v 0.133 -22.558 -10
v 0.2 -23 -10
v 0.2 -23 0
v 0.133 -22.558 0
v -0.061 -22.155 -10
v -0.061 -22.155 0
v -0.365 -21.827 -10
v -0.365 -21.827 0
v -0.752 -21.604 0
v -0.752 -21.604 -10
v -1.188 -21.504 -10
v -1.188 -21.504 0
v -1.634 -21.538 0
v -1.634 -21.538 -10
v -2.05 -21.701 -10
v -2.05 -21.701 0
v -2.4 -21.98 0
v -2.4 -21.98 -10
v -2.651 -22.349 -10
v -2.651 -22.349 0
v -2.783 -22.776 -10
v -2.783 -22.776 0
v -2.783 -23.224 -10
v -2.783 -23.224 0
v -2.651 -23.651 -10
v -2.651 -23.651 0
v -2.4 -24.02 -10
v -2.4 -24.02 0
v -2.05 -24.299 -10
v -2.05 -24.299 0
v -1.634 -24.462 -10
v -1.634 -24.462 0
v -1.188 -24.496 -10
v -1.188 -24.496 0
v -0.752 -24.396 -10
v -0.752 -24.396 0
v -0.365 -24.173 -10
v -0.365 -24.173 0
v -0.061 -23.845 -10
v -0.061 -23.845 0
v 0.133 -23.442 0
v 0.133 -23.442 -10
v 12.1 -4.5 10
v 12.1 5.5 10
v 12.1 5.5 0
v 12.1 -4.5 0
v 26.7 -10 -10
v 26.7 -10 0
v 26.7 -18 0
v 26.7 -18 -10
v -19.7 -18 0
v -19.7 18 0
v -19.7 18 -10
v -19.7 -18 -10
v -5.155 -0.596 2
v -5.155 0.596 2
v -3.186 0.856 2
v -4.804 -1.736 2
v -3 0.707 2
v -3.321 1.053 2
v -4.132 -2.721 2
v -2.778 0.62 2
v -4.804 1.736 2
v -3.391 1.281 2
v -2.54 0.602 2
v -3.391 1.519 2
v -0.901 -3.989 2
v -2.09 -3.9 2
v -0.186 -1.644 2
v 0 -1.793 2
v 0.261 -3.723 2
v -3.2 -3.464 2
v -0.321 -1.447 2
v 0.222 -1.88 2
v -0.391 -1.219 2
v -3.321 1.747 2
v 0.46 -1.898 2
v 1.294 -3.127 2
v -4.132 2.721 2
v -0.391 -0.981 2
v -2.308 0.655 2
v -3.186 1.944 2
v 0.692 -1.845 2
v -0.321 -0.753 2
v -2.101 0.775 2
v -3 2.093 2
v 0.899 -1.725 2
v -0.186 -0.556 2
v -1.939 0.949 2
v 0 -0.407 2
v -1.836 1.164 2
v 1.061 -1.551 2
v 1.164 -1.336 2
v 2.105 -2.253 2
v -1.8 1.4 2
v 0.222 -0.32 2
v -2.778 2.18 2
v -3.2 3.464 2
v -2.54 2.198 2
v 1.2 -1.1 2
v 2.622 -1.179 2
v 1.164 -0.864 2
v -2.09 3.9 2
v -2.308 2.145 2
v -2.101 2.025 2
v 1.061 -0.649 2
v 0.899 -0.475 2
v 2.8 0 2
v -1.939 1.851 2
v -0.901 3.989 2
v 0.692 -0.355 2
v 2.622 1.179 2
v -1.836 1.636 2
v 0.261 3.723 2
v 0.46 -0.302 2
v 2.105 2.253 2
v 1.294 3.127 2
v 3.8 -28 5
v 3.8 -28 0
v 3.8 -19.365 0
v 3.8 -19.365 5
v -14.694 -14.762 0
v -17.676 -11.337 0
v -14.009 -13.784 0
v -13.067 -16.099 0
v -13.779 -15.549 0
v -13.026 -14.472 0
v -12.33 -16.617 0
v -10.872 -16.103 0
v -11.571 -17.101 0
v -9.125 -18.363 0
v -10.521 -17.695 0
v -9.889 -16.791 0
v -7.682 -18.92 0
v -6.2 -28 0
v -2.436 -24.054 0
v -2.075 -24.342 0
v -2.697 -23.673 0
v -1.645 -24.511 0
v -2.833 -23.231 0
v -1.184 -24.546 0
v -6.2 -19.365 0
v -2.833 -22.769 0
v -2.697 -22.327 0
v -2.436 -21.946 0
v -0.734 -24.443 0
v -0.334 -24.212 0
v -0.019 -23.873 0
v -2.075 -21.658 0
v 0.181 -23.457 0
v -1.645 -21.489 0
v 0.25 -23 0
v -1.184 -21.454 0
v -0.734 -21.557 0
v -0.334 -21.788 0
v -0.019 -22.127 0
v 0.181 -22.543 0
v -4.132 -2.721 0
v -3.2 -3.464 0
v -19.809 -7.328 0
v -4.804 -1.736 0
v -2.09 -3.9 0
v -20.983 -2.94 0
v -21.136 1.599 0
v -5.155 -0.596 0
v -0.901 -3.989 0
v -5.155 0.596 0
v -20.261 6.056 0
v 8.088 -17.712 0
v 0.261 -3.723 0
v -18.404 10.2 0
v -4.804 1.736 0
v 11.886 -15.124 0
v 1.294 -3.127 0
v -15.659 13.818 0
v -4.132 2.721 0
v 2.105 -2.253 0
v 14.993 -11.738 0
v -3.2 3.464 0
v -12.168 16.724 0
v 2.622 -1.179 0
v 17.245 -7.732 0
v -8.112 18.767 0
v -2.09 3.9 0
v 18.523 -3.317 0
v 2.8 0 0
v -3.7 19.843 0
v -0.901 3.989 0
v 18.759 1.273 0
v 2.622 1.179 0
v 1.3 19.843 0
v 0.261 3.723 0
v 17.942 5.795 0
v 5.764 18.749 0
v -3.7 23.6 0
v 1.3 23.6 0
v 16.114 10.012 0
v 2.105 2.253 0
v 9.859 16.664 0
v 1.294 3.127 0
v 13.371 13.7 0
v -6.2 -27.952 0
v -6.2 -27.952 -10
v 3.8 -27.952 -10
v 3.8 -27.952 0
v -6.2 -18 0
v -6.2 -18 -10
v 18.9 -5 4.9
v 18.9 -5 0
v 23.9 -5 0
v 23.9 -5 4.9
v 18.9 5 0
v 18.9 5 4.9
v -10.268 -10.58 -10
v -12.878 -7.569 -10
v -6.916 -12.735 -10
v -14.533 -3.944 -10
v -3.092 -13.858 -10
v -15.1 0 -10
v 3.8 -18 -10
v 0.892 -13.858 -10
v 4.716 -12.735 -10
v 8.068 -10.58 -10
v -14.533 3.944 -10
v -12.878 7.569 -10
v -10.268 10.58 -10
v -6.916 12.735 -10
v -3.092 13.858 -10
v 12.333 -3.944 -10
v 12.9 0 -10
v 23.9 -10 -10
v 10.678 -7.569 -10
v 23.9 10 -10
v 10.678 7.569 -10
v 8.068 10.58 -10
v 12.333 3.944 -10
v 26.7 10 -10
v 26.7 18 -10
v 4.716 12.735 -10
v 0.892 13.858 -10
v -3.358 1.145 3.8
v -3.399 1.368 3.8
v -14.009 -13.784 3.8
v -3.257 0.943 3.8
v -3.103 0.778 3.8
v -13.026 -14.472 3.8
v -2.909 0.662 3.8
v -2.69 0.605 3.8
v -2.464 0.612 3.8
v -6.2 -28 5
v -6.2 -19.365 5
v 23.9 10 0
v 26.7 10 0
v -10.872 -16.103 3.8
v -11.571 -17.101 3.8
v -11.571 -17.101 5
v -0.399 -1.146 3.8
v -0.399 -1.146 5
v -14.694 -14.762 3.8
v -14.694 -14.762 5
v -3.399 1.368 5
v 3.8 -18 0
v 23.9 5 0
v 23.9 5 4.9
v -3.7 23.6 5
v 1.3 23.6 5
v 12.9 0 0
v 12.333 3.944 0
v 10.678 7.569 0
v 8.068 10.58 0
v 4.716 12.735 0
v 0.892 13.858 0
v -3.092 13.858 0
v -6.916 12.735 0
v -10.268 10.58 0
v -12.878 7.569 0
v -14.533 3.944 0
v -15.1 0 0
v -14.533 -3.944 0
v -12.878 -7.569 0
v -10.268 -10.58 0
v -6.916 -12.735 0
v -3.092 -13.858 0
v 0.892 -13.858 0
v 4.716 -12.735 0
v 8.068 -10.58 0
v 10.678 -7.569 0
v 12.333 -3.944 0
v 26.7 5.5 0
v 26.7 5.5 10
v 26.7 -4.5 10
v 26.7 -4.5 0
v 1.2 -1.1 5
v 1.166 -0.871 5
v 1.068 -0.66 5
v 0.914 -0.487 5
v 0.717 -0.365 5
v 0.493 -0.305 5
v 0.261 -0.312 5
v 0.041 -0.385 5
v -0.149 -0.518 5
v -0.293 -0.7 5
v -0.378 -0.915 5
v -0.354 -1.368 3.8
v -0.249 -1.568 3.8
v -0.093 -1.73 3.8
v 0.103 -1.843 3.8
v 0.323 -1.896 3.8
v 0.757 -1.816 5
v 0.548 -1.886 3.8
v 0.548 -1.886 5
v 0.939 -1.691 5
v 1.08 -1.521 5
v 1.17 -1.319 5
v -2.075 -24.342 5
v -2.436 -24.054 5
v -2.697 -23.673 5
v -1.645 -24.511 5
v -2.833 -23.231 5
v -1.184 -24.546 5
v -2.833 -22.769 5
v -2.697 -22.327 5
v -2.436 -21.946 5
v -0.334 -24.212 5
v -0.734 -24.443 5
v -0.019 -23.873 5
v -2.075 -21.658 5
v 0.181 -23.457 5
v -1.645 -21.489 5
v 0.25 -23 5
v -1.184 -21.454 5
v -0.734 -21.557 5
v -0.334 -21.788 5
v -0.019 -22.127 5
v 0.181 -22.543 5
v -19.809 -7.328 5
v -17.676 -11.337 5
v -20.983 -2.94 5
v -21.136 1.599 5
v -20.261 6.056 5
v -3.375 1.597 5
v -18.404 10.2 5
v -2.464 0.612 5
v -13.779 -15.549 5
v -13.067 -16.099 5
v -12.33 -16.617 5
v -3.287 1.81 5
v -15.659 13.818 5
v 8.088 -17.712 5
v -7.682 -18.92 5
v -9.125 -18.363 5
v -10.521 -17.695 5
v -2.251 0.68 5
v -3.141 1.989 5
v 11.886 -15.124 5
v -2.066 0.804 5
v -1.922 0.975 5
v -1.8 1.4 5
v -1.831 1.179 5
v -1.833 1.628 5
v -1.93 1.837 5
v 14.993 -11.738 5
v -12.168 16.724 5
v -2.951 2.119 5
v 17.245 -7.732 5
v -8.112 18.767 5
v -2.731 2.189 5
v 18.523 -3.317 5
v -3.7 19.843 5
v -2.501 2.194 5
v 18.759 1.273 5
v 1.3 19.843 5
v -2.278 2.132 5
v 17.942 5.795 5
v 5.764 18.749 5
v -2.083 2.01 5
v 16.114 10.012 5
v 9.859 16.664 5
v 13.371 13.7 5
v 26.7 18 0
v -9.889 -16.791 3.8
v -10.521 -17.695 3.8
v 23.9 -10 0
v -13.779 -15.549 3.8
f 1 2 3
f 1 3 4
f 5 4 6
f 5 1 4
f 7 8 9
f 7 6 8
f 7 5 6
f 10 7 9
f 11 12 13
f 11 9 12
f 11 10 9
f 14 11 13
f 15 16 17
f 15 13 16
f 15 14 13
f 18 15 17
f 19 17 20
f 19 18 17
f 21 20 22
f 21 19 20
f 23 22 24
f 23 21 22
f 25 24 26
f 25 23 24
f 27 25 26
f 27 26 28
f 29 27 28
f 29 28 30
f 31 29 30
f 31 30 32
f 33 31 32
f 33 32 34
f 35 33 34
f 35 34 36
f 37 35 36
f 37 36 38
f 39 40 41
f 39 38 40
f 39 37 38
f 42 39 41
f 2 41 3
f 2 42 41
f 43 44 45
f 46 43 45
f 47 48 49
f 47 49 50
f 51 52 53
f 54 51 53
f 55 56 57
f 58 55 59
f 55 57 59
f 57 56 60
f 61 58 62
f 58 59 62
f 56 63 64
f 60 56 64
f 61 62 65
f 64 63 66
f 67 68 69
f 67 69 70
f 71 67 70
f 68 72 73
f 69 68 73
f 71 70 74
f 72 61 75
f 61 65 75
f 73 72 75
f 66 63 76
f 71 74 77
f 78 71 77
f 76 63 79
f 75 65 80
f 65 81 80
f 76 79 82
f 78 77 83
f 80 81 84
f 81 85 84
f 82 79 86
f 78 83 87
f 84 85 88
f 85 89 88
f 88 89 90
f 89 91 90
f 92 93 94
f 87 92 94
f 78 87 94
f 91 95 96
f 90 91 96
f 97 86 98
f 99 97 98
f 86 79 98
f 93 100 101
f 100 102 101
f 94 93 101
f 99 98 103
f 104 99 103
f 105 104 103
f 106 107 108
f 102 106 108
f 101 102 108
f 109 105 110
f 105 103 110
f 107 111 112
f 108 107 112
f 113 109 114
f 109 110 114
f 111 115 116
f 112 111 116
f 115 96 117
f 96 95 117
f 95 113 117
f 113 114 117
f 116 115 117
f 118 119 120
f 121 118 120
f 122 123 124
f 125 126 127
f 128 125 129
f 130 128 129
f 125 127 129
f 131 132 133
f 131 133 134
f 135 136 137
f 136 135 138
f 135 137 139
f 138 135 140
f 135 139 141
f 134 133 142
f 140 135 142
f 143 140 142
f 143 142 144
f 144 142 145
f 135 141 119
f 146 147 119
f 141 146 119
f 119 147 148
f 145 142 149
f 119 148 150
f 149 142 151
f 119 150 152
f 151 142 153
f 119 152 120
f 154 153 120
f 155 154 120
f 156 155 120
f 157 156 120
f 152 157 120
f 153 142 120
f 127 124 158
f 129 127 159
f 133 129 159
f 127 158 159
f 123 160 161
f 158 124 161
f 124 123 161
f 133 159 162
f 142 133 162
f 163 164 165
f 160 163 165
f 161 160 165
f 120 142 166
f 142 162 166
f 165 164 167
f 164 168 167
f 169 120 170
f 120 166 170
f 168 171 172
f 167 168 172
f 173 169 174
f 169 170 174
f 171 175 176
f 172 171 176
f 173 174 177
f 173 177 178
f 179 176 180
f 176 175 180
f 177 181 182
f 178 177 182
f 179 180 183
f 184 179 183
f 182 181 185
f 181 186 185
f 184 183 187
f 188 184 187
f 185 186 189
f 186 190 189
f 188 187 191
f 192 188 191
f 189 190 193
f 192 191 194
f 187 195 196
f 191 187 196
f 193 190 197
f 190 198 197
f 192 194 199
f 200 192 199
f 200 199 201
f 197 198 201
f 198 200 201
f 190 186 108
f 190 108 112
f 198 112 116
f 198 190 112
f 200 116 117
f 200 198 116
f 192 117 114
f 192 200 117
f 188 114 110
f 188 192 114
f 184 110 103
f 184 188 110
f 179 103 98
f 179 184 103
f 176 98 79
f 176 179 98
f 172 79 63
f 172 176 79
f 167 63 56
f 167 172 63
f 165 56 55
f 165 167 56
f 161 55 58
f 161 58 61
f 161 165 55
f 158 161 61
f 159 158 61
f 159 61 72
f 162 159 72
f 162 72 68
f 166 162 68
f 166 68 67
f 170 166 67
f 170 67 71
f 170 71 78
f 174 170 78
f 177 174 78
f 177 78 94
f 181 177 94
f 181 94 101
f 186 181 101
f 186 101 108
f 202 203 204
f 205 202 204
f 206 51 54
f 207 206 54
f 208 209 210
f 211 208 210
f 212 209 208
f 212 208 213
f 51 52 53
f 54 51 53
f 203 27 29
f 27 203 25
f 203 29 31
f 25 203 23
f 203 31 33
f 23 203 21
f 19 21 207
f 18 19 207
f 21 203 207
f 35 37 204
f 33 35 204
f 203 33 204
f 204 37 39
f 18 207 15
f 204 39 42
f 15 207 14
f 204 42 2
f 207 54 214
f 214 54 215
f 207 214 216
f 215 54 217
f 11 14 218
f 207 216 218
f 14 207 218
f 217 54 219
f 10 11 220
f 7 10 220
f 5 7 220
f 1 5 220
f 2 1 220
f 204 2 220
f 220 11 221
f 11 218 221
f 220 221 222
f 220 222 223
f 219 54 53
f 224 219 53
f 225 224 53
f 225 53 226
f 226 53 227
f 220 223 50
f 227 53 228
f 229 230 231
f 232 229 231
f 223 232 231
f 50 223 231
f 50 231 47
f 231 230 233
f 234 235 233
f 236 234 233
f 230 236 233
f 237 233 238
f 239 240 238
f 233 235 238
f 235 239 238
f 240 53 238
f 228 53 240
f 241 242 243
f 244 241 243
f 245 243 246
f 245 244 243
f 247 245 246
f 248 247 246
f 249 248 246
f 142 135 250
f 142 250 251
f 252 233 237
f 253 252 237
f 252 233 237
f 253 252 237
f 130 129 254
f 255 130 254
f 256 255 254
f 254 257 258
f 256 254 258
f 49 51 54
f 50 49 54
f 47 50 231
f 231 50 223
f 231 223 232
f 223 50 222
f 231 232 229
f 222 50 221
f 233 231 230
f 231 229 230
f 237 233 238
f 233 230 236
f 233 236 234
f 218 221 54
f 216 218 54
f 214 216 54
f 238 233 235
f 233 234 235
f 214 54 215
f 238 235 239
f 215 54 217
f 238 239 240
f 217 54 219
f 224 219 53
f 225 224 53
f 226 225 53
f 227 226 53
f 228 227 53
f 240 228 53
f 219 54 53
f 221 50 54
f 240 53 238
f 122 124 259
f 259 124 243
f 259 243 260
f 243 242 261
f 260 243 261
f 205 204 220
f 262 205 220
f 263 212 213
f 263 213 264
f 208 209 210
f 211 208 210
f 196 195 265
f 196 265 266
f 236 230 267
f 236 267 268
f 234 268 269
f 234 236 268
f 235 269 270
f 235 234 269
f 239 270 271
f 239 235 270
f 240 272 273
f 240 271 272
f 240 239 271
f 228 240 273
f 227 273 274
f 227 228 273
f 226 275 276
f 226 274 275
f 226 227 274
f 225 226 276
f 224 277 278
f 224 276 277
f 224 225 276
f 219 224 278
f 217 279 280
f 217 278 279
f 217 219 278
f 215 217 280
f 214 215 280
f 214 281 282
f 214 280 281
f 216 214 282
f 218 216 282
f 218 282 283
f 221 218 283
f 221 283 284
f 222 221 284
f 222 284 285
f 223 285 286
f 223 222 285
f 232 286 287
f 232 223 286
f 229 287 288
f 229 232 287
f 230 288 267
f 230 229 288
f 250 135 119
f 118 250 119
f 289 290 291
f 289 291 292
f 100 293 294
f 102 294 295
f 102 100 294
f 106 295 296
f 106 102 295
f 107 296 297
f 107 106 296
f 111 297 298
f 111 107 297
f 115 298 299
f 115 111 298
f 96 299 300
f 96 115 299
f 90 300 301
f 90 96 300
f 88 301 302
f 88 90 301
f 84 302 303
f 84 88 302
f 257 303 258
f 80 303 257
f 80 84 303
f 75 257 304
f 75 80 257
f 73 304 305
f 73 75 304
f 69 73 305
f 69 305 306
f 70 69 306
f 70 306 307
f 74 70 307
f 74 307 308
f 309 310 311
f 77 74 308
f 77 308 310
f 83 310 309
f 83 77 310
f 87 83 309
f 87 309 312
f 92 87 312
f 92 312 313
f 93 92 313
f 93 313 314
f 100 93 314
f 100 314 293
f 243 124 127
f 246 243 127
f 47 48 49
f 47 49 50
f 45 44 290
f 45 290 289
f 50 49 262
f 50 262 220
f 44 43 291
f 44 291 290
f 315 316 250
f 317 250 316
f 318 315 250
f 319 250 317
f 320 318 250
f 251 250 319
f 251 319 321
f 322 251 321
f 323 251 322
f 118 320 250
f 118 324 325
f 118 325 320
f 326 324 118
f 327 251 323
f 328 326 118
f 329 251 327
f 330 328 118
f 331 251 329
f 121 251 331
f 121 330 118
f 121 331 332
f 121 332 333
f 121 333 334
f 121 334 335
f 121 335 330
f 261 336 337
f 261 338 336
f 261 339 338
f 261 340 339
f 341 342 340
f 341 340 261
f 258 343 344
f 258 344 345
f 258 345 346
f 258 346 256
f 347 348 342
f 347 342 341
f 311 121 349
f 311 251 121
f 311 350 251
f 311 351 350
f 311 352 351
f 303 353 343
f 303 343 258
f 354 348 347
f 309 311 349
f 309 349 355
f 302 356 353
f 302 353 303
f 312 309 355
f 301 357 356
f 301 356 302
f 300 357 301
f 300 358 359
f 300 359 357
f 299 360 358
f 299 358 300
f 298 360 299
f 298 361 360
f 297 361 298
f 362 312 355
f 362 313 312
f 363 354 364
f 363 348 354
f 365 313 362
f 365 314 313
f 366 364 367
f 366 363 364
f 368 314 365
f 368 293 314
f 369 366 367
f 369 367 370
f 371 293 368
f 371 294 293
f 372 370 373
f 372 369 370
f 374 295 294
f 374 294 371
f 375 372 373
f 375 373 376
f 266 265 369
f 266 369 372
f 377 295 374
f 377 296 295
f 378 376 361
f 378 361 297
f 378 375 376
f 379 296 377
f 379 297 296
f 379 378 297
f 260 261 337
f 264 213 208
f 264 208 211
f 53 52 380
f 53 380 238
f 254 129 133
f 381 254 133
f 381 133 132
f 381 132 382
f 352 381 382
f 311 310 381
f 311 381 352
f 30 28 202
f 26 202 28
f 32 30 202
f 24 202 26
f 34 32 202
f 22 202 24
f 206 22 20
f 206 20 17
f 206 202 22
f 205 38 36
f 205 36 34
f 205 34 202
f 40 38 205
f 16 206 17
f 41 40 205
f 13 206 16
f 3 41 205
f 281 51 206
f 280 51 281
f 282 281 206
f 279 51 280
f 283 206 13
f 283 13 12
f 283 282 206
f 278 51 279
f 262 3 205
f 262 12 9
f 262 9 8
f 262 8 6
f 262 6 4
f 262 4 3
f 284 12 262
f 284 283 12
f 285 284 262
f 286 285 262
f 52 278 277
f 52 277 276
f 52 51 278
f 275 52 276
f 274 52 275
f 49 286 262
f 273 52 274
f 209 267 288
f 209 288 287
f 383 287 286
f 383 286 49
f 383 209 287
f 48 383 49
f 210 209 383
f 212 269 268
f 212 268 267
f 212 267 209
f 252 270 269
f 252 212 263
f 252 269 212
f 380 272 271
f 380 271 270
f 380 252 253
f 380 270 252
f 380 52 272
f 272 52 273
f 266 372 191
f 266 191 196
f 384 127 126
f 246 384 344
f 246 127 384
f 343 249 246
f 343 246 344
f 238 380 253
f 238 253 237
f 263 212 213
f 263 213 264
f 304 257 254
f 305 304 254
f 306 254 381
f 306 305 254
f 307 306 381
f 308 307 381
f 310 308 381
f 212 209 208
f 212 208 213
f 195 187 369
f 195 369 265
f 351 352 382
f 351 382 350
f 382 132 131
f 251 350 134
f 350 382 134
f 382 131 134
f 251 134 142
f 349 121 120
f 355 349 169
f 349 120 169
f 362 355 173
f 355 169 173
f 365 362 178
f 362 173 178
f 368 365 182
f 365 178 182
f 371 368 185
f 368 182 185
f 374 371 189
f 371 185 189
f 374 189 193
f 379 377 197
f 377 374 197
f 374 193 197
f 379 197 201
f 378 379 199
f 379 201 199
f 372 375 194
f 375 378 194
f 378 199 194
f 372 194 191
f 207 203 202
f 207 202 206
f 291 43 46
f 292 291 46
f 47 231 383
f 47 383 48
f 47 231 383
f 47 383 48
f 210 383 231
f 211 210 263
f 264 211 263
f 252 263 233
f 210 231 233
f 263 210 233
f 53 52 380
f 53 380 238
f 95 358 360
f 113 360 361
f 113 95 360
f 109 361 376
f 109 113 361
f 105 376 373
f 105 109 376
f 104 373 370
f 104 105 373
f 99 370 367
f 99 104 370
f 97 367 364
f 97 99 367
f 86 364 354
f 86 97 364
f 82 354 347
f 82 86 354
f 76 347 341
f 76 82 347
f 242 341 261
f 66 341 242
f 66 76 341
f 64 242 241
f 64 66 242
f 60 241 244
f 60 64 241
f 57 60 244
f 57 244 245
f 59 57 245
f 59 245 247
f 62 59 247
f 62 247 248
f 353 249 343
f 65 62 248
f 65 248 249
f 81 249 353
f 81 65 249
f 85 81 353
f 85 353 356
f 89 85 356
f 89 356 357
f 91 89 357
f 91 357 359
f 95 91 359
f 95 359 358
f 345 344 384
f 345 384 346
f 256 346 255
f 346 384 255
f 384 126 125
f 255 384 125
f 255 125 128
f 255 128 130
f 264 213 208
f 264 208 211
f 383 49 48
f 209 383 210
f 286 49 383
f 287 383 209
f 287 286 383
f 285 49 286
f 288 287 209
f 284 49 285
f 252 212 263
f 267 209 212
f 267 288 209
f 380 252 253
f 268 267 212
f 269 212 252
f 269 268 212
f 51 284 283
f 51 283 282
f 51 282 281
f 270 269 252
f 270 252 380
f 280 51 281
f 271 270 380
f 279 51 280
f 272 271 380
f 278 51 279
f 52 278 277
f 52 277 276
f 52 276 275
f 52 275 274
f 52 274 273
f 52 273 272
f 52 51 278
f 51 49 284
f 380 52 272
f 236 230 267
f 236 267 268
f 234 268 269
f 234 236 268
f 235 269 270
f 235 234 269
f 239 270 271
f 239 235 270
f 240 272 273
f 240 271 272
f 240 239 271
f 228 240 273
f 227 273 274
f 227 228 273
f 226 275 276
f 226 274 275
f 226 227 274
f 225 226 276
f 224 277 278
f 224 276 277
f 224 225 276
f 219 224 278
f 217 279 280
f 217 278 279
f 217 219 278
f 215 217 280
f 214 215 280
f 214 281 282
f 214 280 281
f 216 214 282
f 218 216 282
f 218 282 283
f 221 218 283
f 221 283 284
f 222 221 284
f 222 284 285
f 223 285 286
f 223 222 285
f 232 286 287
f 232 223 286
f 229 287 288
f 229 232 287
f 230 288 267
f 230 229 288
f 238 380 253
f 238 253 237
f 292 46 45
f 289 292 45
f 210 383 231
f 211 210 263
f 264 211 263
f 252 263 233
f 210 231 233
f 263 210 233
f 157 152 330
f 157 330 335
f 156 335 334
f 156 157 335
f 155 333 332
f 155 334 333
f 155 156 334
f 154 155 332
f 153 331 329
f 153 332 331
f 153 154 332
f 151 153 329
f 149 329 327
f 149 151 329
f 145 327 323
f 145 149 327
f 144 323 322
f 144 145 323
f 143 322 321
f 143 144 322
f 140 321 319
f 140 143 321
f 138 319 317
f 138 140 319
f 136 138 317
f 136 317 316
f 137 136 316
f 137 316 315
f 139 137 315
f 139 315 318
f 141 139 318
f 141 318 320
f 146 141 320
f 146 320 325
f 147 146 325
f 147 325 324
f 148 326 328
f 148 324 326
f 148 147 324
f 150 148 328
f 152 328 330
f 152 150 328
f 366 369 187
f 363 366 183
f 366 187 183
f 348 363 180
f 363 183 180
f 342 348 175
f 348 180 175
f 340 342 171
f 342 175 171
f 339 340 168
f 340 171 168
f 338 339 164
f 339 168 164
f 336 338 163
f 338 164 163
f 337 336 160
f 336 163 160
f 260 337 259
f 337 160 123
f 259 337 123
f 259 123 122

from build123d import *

# Parameters (mm, degrees)
BOX001_W               = 10
BOX001_H               = 10
BOX001_DEPTH           = 14.6
BOX004_W               = 5
BOX004_H               = 10
BOX004_DEPTH           = 5
BOX005_W               = 10
BOX005_H               = 20
BOX005_DEPTH           = 20
CYLINDER_R             = 14
CYLINDER_DEPTH         = 40
BOX_W                  = 10
BOX_H                  = 36
BOX_DEPTH              = 46.4
BOX006_W               = 5
BOX006_H               = 5
BOX006_DEPTH           = 5
CYLINDER003_R          = 1.55
CYLINDER003_DEPTH      = 50
BOX003_W               = 10
BOX003_H               = 14
BOX003_DEPTH           = 5
BOX010_W               = 1.2
BOX010_H               = 30
BOX010_DEPTH           = 10
BOX010_ROLL_ANGLE      = 90
BOX010_PLACEMENT_ANGLE = -35
BOX009_W               = 1.2
BOX009_H               = 30
BOX009_DEPTH           = 10
BOX009_ROLL_ANGLE      = 90
BOX009_PLACEMENT_ANGLE = -35
BOX008_W               = 1.2
BOX008_H               = 30
BOX008_DEPTH           = 10
BOX008_PLACEMENT_ANGLE = 325
BOX007_W               = 1.2
BOX007_H               = 30
BOX007_DEPTH           = 10
BOX007_PLACEMENT_ANGLE = 325
CYLINDER006_R          = 0.8
CYLINDER006_DEPTH      = 30
CYLINDER005_R          = 0.8
CYLINDER005_DEPTH      = 30
CYLINDER004_R          = 4
CYLINDER004_DEPTH      = 10
CYLINDER002_R          = 20
CYLINDER002_DEPTH      = 5
CYLINDER001_R          = 1.5
CYLINDER001_DEPTH      = 30
BOX002_W               = 10
BOX002_H               = 10
BOX002_DEPTH           = 10


with BuildPart() as cube001:
    # Box001 → Box001 (new body)
    with BuildSketch(Plane(origin=(12.1, -4.5, 10), x_dir=(0, 0, -1), z_dir=(1, 0, 0))):
        with Locations((5, 5)):
            Rectangle(BOX001_W, BOX001_H)
    extrude(amount=BOX001_DEPTH)


with BuildPart() as swivelstop:
    # Box004 → Box004 (new body)
    with BuildSketch(Plane(origin=(18.9, -5, -0.1), x_dir=(1, 0, 0), z_dir=(0, 0, 1))):
        with Locations((2.5, 5)):
            Rectangle(BOX004_W, BOX004_H)
    extrude(amount=BOX004_DEPTH)


with BuildPart() as footcutout:
    # Box005 → Box005 (new body)
    with BuildSketch(Plane(origin=(23.9, -10, -18), x_dir=(1, 0, 0), z_dir=(0, 0, 1))):
        with Locations((5, 10)):
            Rectangle(BOX005_W, BOX005_H)
    extrude(amount=BOX005_DEPTH)


with BuildPart() as cardboardbarrelholder:
    # Cylinder → Cylinder (new body)
    with BuildSketch(Plane(origin=(-1.1, 0, -20), x_dir=(1, 0, 0), z_dir=(0, 0, 1))):
        Circle(CYLINDER_R)
    extrude(amount=CYLINDER_DEPTH)


with BuildPart() as mainpiece1:
    # Box → Box (new body)
    with BuildSketch(Plane(origin=(-19.7, -18, 0), x_dir=(0, 0, -1), z_dir=(1, 0, 0))):
        with Locations((5, 18)):
            Rectangle(BOX_W, BOX_H)
    extrude(amount=BOX_DEPTH)

    # Cut: cut cardboardBarrelHolder
    add(cardboardbarrelholder.part, mode=Mode.SUBTRACT)

    # Cut001: cut footCutout
    add(footcutout.part, mode=Mode.SUBTRACT)


with BuildPart() as don_tusemainpiece3:
    # Fusion002 base: copy of mainPiece1
    add(mainpiece1.part)

    # Fusion002: union swivelStop
    add(swivelstop.part)


with BuildPart() as shuttermovetab:
    # Box006 → Box006 (new body)
    with BuildSketch(Plane(origin=(-3.7, 18.6, 0), x_dir=(1, 0, 0), z_dir=(0, 0, 1))):
        with Locations((2.5, 2.5)):
            Rectangle(BOX006_W, BOX006_H)
    extrude(amount=BOX006_DEPTH)


with BuildPart() as shuttertabhole:
    # Cylinder003 → Cylinder003 (new body)
    with BuildSketch(Plane(origin=(-1.3, -23, -12), x_dir=(1, 0, 0), z_dir=(0, 0, 1))):
        Circle(CYLINDER003_R)
    extrude(amount=CYLINDER003_DEPTH)


with BuildPart() as shutterhingetab001:
    # Box003 → Box003 (new body)
    with BuildSketch(Plane(origin=(-6.2, -28, 0), x_dir=(1, 0, 0), z_dir=(0, 0, 1))):
        with Locations((5, 7)):
            Rectangle(BOX003_W, BOX003_H)
    extrude(amount=BOX003_DEPTH)

    # Cut009: cut shutterTabHole
    add(shuttertabhole.part, mode=Mode.SUBTRACT)


with BuildPart() as radialtransit4:
    # Box010 → Box010 (new body)
    with BuildSketch(Plane.XY):
        with Locations((0.6, 15)):
            Rectangle(BOX010_W, BOX010_H)
    extrude(amount=BOX010_DEPTH)


with BuildPart() as radialtransit4_1:
    # Box010 roll: moved
    add(radialtransit4.part.rotate(Axis((0, 0, 0), (1, 0, 0)), BOX010_ROLL_ANGLE))


with BuildPart() as radialtransit4_2:
    # Box010 placement: moved
    add(radialtransit4_1.part.moved(Location((-14.008889, -13.784169, -4.1))).rotate(Axis((-14.008889, -13.784169, -4.1), (0, 0, 1)), BOX010_PLACEMENT_ANGLE))


with BuildPart() as radialtransit3:
    # Box009 → Box009 (new body)
    with BuildSketch(Plane.XY):
        with Locations((0.6, 15)):
            Rectangle(BOX009_W, BOX009_H)
    extrude(amount=BOX009_DEPTH)


with BuildPart() as radialtransit3_1:
    # Box009 roll: moved
    add(radialtransit3.part.rotate(Axis((0, 0, 0), (1, 0, 0)), BOX009_ROLL_ANGLE))


with BuildPart() as radialtransit3_2:
    # Box009 placement: moved
    add(radialtransit3_1.part.moved(Location((-10.871554, -16.103032, -4.1))).rotate(Axis((-10.871554, -16.103032, -4.1), (0, 0, 1)), BOX009_PLACEMENT_ANGLE))


with BuildPart() as radialtransit2:
    # Box008 → Box008 (new body)
    with BuildSketch(Plane.XY):
        with Locations((0.6, 15)):
            Rectangle(BOX008_W, BOX008_H)
    extrude(amount=BOX008_DEPTH)


with BuildPart() as radialtransit2_1:
    # Box008 placement: moved
    add(radialtransit2.part.moved(Location((-20.375588, -22.876757, 3.8))).rotate(Axis((-20.375588, -22.876757, 3.8), (0, 0, 1)), BOX008_PLACEMENT_ANGLE))


with BuildPart() as radialtransit1:
    # Box007 → Box007 (new body)
    with BuildSketch(Plane.XY):
        with Locations((0.6, 15)):
            Rectangle(BOX007_W, BOX007_H)
    extrude(amount=BOX007_DEPTH)


with BuildPart() as radialtransit1_1:
    # Box007 placement: moved
    add(radialtransit1.part.moved(Location((-17.352968, -25.35945, 3.8))).rotate(Axis((-17.352968, -25.35945, 3.8), (0, 0, 1)), BOX007_PLACEMENT_ANGLE))


with BuildPart() as cdswire2:
    # Cylinder006 → Cylinder006 (new body)
    with BuildSketch(Plane(origin=(-2.6, 1.4, -18), x_dir=(1, 0, 0), z_dir=(0, 0, 1))):
        Circle(CYLINDER006_R)
    extrude(amount=CYLINDER006_DEPTH)


with BuildPart() as cdswire1:
    # Cylinder005 → Cylinder005 (new body)
    with BuildSketch(Plane(origin=(0.4, -1.1, -18), x_dir=(1, 0, 0), z_dir=(0, 0, 1))):
        Circle(CYLINDER005_R)
    extrude(amount=CYLINDER005_DEPTH)


with BuildPart() as cdsdivot:
    # Cylinder004 → Cylinder004 (new body)
    with BuildSketch(Plane(origin=(-1.2, 0, -8), x_dir=(1, 0, 0), z_dir=(0, 0, 1))):
        Circle(CYLINDER004_R)
    extrude(amount=CYLINDER004_DEPTH)


with BuildPart() as shutter4:
    # Cylinder002 → Cylinder002 (new body)
    with BuildSketch(Plane(origin=(-1.2, 0, 0), x_dir=(1, 0, 0), z_dir=(0, 0, 1))):
        Circle(CYLINDER002_R)
    extrude(amount=CYLINDER002_DEPTH)

    # Cut002: cut CdSDivot
    add(cdsdivot.part, mode=Mode.SUBTRACT)

    # Cut003: cut CdSWire1
    add(cdswire1.part, mode=Mode.SUBTRACT)

    # Cut004: cut CdsWire2
    add(cdswire2.part, mode=Mode.SUBTRACT)

    # Cut005: cut radialTransit1
    add(radialtransit1_1.part, mode=Mode.SUBTRACT)

    # Cut006: cut radialTransit2
    add(radialtransit2_1.part, mode=Mode.SUBTRACT)

    # Cut007: cut radialTransit3
    add(radialtransit3_2.part, mode=Mode.SUBTRACT)

    # Cut008: cut radialTransit4
    add(radialtransit4_2.part, mode=Mode.SUBTRACT)

    # Fusion001: union shutterHingeTab001
    add(shutterhingetab001.part)

    # Fusion003: union shutterMoveTab
    add(shuttermovetab.part)


with BuildPart() as hingetabhole:
    # Cylinder001 → Cylinder001 (new body)
    with BuildSketch(Plane(origin=(-1.3, -23, -12), x_dir=(1, 0, 0), z_dir=(0, 0, 1))):
        Circle(CYLINDER001_R)
    extrude(amount=CYLINDER001_DEPTH)


with BuildPart() as mainpiecehingetab:
    # Box002 → Box002 (new body)
    with BuildSketch(Plane(origin=(-6.2, -27.952, -10), x_dir=(1, 0, 0), z_dir=(0, 0, 1))):
        with Locations((5, 5)):
            Rectangle(BOX002_W, BOX002_H)
    extrude(amount=BOX002_DEPTH)

    # Cut010: cut hingeTabHole
    add(hingetabhole.part, mode=Mode.SUBTRACT)


with BuildPart() as mainpiece10:
    # Fusion base: copy of mainPiece1
    add(mainpiece1.part)

    # Fusion: union mainPieceHingeTab
    add(mainpiecehingetab.part)

    # Fusion004: union swivelStop
    add(swivelstop.part)


solid = Compound([cube001.part, don_tusemainpiece3.part, shutter4.part, mainpiece10.part])
